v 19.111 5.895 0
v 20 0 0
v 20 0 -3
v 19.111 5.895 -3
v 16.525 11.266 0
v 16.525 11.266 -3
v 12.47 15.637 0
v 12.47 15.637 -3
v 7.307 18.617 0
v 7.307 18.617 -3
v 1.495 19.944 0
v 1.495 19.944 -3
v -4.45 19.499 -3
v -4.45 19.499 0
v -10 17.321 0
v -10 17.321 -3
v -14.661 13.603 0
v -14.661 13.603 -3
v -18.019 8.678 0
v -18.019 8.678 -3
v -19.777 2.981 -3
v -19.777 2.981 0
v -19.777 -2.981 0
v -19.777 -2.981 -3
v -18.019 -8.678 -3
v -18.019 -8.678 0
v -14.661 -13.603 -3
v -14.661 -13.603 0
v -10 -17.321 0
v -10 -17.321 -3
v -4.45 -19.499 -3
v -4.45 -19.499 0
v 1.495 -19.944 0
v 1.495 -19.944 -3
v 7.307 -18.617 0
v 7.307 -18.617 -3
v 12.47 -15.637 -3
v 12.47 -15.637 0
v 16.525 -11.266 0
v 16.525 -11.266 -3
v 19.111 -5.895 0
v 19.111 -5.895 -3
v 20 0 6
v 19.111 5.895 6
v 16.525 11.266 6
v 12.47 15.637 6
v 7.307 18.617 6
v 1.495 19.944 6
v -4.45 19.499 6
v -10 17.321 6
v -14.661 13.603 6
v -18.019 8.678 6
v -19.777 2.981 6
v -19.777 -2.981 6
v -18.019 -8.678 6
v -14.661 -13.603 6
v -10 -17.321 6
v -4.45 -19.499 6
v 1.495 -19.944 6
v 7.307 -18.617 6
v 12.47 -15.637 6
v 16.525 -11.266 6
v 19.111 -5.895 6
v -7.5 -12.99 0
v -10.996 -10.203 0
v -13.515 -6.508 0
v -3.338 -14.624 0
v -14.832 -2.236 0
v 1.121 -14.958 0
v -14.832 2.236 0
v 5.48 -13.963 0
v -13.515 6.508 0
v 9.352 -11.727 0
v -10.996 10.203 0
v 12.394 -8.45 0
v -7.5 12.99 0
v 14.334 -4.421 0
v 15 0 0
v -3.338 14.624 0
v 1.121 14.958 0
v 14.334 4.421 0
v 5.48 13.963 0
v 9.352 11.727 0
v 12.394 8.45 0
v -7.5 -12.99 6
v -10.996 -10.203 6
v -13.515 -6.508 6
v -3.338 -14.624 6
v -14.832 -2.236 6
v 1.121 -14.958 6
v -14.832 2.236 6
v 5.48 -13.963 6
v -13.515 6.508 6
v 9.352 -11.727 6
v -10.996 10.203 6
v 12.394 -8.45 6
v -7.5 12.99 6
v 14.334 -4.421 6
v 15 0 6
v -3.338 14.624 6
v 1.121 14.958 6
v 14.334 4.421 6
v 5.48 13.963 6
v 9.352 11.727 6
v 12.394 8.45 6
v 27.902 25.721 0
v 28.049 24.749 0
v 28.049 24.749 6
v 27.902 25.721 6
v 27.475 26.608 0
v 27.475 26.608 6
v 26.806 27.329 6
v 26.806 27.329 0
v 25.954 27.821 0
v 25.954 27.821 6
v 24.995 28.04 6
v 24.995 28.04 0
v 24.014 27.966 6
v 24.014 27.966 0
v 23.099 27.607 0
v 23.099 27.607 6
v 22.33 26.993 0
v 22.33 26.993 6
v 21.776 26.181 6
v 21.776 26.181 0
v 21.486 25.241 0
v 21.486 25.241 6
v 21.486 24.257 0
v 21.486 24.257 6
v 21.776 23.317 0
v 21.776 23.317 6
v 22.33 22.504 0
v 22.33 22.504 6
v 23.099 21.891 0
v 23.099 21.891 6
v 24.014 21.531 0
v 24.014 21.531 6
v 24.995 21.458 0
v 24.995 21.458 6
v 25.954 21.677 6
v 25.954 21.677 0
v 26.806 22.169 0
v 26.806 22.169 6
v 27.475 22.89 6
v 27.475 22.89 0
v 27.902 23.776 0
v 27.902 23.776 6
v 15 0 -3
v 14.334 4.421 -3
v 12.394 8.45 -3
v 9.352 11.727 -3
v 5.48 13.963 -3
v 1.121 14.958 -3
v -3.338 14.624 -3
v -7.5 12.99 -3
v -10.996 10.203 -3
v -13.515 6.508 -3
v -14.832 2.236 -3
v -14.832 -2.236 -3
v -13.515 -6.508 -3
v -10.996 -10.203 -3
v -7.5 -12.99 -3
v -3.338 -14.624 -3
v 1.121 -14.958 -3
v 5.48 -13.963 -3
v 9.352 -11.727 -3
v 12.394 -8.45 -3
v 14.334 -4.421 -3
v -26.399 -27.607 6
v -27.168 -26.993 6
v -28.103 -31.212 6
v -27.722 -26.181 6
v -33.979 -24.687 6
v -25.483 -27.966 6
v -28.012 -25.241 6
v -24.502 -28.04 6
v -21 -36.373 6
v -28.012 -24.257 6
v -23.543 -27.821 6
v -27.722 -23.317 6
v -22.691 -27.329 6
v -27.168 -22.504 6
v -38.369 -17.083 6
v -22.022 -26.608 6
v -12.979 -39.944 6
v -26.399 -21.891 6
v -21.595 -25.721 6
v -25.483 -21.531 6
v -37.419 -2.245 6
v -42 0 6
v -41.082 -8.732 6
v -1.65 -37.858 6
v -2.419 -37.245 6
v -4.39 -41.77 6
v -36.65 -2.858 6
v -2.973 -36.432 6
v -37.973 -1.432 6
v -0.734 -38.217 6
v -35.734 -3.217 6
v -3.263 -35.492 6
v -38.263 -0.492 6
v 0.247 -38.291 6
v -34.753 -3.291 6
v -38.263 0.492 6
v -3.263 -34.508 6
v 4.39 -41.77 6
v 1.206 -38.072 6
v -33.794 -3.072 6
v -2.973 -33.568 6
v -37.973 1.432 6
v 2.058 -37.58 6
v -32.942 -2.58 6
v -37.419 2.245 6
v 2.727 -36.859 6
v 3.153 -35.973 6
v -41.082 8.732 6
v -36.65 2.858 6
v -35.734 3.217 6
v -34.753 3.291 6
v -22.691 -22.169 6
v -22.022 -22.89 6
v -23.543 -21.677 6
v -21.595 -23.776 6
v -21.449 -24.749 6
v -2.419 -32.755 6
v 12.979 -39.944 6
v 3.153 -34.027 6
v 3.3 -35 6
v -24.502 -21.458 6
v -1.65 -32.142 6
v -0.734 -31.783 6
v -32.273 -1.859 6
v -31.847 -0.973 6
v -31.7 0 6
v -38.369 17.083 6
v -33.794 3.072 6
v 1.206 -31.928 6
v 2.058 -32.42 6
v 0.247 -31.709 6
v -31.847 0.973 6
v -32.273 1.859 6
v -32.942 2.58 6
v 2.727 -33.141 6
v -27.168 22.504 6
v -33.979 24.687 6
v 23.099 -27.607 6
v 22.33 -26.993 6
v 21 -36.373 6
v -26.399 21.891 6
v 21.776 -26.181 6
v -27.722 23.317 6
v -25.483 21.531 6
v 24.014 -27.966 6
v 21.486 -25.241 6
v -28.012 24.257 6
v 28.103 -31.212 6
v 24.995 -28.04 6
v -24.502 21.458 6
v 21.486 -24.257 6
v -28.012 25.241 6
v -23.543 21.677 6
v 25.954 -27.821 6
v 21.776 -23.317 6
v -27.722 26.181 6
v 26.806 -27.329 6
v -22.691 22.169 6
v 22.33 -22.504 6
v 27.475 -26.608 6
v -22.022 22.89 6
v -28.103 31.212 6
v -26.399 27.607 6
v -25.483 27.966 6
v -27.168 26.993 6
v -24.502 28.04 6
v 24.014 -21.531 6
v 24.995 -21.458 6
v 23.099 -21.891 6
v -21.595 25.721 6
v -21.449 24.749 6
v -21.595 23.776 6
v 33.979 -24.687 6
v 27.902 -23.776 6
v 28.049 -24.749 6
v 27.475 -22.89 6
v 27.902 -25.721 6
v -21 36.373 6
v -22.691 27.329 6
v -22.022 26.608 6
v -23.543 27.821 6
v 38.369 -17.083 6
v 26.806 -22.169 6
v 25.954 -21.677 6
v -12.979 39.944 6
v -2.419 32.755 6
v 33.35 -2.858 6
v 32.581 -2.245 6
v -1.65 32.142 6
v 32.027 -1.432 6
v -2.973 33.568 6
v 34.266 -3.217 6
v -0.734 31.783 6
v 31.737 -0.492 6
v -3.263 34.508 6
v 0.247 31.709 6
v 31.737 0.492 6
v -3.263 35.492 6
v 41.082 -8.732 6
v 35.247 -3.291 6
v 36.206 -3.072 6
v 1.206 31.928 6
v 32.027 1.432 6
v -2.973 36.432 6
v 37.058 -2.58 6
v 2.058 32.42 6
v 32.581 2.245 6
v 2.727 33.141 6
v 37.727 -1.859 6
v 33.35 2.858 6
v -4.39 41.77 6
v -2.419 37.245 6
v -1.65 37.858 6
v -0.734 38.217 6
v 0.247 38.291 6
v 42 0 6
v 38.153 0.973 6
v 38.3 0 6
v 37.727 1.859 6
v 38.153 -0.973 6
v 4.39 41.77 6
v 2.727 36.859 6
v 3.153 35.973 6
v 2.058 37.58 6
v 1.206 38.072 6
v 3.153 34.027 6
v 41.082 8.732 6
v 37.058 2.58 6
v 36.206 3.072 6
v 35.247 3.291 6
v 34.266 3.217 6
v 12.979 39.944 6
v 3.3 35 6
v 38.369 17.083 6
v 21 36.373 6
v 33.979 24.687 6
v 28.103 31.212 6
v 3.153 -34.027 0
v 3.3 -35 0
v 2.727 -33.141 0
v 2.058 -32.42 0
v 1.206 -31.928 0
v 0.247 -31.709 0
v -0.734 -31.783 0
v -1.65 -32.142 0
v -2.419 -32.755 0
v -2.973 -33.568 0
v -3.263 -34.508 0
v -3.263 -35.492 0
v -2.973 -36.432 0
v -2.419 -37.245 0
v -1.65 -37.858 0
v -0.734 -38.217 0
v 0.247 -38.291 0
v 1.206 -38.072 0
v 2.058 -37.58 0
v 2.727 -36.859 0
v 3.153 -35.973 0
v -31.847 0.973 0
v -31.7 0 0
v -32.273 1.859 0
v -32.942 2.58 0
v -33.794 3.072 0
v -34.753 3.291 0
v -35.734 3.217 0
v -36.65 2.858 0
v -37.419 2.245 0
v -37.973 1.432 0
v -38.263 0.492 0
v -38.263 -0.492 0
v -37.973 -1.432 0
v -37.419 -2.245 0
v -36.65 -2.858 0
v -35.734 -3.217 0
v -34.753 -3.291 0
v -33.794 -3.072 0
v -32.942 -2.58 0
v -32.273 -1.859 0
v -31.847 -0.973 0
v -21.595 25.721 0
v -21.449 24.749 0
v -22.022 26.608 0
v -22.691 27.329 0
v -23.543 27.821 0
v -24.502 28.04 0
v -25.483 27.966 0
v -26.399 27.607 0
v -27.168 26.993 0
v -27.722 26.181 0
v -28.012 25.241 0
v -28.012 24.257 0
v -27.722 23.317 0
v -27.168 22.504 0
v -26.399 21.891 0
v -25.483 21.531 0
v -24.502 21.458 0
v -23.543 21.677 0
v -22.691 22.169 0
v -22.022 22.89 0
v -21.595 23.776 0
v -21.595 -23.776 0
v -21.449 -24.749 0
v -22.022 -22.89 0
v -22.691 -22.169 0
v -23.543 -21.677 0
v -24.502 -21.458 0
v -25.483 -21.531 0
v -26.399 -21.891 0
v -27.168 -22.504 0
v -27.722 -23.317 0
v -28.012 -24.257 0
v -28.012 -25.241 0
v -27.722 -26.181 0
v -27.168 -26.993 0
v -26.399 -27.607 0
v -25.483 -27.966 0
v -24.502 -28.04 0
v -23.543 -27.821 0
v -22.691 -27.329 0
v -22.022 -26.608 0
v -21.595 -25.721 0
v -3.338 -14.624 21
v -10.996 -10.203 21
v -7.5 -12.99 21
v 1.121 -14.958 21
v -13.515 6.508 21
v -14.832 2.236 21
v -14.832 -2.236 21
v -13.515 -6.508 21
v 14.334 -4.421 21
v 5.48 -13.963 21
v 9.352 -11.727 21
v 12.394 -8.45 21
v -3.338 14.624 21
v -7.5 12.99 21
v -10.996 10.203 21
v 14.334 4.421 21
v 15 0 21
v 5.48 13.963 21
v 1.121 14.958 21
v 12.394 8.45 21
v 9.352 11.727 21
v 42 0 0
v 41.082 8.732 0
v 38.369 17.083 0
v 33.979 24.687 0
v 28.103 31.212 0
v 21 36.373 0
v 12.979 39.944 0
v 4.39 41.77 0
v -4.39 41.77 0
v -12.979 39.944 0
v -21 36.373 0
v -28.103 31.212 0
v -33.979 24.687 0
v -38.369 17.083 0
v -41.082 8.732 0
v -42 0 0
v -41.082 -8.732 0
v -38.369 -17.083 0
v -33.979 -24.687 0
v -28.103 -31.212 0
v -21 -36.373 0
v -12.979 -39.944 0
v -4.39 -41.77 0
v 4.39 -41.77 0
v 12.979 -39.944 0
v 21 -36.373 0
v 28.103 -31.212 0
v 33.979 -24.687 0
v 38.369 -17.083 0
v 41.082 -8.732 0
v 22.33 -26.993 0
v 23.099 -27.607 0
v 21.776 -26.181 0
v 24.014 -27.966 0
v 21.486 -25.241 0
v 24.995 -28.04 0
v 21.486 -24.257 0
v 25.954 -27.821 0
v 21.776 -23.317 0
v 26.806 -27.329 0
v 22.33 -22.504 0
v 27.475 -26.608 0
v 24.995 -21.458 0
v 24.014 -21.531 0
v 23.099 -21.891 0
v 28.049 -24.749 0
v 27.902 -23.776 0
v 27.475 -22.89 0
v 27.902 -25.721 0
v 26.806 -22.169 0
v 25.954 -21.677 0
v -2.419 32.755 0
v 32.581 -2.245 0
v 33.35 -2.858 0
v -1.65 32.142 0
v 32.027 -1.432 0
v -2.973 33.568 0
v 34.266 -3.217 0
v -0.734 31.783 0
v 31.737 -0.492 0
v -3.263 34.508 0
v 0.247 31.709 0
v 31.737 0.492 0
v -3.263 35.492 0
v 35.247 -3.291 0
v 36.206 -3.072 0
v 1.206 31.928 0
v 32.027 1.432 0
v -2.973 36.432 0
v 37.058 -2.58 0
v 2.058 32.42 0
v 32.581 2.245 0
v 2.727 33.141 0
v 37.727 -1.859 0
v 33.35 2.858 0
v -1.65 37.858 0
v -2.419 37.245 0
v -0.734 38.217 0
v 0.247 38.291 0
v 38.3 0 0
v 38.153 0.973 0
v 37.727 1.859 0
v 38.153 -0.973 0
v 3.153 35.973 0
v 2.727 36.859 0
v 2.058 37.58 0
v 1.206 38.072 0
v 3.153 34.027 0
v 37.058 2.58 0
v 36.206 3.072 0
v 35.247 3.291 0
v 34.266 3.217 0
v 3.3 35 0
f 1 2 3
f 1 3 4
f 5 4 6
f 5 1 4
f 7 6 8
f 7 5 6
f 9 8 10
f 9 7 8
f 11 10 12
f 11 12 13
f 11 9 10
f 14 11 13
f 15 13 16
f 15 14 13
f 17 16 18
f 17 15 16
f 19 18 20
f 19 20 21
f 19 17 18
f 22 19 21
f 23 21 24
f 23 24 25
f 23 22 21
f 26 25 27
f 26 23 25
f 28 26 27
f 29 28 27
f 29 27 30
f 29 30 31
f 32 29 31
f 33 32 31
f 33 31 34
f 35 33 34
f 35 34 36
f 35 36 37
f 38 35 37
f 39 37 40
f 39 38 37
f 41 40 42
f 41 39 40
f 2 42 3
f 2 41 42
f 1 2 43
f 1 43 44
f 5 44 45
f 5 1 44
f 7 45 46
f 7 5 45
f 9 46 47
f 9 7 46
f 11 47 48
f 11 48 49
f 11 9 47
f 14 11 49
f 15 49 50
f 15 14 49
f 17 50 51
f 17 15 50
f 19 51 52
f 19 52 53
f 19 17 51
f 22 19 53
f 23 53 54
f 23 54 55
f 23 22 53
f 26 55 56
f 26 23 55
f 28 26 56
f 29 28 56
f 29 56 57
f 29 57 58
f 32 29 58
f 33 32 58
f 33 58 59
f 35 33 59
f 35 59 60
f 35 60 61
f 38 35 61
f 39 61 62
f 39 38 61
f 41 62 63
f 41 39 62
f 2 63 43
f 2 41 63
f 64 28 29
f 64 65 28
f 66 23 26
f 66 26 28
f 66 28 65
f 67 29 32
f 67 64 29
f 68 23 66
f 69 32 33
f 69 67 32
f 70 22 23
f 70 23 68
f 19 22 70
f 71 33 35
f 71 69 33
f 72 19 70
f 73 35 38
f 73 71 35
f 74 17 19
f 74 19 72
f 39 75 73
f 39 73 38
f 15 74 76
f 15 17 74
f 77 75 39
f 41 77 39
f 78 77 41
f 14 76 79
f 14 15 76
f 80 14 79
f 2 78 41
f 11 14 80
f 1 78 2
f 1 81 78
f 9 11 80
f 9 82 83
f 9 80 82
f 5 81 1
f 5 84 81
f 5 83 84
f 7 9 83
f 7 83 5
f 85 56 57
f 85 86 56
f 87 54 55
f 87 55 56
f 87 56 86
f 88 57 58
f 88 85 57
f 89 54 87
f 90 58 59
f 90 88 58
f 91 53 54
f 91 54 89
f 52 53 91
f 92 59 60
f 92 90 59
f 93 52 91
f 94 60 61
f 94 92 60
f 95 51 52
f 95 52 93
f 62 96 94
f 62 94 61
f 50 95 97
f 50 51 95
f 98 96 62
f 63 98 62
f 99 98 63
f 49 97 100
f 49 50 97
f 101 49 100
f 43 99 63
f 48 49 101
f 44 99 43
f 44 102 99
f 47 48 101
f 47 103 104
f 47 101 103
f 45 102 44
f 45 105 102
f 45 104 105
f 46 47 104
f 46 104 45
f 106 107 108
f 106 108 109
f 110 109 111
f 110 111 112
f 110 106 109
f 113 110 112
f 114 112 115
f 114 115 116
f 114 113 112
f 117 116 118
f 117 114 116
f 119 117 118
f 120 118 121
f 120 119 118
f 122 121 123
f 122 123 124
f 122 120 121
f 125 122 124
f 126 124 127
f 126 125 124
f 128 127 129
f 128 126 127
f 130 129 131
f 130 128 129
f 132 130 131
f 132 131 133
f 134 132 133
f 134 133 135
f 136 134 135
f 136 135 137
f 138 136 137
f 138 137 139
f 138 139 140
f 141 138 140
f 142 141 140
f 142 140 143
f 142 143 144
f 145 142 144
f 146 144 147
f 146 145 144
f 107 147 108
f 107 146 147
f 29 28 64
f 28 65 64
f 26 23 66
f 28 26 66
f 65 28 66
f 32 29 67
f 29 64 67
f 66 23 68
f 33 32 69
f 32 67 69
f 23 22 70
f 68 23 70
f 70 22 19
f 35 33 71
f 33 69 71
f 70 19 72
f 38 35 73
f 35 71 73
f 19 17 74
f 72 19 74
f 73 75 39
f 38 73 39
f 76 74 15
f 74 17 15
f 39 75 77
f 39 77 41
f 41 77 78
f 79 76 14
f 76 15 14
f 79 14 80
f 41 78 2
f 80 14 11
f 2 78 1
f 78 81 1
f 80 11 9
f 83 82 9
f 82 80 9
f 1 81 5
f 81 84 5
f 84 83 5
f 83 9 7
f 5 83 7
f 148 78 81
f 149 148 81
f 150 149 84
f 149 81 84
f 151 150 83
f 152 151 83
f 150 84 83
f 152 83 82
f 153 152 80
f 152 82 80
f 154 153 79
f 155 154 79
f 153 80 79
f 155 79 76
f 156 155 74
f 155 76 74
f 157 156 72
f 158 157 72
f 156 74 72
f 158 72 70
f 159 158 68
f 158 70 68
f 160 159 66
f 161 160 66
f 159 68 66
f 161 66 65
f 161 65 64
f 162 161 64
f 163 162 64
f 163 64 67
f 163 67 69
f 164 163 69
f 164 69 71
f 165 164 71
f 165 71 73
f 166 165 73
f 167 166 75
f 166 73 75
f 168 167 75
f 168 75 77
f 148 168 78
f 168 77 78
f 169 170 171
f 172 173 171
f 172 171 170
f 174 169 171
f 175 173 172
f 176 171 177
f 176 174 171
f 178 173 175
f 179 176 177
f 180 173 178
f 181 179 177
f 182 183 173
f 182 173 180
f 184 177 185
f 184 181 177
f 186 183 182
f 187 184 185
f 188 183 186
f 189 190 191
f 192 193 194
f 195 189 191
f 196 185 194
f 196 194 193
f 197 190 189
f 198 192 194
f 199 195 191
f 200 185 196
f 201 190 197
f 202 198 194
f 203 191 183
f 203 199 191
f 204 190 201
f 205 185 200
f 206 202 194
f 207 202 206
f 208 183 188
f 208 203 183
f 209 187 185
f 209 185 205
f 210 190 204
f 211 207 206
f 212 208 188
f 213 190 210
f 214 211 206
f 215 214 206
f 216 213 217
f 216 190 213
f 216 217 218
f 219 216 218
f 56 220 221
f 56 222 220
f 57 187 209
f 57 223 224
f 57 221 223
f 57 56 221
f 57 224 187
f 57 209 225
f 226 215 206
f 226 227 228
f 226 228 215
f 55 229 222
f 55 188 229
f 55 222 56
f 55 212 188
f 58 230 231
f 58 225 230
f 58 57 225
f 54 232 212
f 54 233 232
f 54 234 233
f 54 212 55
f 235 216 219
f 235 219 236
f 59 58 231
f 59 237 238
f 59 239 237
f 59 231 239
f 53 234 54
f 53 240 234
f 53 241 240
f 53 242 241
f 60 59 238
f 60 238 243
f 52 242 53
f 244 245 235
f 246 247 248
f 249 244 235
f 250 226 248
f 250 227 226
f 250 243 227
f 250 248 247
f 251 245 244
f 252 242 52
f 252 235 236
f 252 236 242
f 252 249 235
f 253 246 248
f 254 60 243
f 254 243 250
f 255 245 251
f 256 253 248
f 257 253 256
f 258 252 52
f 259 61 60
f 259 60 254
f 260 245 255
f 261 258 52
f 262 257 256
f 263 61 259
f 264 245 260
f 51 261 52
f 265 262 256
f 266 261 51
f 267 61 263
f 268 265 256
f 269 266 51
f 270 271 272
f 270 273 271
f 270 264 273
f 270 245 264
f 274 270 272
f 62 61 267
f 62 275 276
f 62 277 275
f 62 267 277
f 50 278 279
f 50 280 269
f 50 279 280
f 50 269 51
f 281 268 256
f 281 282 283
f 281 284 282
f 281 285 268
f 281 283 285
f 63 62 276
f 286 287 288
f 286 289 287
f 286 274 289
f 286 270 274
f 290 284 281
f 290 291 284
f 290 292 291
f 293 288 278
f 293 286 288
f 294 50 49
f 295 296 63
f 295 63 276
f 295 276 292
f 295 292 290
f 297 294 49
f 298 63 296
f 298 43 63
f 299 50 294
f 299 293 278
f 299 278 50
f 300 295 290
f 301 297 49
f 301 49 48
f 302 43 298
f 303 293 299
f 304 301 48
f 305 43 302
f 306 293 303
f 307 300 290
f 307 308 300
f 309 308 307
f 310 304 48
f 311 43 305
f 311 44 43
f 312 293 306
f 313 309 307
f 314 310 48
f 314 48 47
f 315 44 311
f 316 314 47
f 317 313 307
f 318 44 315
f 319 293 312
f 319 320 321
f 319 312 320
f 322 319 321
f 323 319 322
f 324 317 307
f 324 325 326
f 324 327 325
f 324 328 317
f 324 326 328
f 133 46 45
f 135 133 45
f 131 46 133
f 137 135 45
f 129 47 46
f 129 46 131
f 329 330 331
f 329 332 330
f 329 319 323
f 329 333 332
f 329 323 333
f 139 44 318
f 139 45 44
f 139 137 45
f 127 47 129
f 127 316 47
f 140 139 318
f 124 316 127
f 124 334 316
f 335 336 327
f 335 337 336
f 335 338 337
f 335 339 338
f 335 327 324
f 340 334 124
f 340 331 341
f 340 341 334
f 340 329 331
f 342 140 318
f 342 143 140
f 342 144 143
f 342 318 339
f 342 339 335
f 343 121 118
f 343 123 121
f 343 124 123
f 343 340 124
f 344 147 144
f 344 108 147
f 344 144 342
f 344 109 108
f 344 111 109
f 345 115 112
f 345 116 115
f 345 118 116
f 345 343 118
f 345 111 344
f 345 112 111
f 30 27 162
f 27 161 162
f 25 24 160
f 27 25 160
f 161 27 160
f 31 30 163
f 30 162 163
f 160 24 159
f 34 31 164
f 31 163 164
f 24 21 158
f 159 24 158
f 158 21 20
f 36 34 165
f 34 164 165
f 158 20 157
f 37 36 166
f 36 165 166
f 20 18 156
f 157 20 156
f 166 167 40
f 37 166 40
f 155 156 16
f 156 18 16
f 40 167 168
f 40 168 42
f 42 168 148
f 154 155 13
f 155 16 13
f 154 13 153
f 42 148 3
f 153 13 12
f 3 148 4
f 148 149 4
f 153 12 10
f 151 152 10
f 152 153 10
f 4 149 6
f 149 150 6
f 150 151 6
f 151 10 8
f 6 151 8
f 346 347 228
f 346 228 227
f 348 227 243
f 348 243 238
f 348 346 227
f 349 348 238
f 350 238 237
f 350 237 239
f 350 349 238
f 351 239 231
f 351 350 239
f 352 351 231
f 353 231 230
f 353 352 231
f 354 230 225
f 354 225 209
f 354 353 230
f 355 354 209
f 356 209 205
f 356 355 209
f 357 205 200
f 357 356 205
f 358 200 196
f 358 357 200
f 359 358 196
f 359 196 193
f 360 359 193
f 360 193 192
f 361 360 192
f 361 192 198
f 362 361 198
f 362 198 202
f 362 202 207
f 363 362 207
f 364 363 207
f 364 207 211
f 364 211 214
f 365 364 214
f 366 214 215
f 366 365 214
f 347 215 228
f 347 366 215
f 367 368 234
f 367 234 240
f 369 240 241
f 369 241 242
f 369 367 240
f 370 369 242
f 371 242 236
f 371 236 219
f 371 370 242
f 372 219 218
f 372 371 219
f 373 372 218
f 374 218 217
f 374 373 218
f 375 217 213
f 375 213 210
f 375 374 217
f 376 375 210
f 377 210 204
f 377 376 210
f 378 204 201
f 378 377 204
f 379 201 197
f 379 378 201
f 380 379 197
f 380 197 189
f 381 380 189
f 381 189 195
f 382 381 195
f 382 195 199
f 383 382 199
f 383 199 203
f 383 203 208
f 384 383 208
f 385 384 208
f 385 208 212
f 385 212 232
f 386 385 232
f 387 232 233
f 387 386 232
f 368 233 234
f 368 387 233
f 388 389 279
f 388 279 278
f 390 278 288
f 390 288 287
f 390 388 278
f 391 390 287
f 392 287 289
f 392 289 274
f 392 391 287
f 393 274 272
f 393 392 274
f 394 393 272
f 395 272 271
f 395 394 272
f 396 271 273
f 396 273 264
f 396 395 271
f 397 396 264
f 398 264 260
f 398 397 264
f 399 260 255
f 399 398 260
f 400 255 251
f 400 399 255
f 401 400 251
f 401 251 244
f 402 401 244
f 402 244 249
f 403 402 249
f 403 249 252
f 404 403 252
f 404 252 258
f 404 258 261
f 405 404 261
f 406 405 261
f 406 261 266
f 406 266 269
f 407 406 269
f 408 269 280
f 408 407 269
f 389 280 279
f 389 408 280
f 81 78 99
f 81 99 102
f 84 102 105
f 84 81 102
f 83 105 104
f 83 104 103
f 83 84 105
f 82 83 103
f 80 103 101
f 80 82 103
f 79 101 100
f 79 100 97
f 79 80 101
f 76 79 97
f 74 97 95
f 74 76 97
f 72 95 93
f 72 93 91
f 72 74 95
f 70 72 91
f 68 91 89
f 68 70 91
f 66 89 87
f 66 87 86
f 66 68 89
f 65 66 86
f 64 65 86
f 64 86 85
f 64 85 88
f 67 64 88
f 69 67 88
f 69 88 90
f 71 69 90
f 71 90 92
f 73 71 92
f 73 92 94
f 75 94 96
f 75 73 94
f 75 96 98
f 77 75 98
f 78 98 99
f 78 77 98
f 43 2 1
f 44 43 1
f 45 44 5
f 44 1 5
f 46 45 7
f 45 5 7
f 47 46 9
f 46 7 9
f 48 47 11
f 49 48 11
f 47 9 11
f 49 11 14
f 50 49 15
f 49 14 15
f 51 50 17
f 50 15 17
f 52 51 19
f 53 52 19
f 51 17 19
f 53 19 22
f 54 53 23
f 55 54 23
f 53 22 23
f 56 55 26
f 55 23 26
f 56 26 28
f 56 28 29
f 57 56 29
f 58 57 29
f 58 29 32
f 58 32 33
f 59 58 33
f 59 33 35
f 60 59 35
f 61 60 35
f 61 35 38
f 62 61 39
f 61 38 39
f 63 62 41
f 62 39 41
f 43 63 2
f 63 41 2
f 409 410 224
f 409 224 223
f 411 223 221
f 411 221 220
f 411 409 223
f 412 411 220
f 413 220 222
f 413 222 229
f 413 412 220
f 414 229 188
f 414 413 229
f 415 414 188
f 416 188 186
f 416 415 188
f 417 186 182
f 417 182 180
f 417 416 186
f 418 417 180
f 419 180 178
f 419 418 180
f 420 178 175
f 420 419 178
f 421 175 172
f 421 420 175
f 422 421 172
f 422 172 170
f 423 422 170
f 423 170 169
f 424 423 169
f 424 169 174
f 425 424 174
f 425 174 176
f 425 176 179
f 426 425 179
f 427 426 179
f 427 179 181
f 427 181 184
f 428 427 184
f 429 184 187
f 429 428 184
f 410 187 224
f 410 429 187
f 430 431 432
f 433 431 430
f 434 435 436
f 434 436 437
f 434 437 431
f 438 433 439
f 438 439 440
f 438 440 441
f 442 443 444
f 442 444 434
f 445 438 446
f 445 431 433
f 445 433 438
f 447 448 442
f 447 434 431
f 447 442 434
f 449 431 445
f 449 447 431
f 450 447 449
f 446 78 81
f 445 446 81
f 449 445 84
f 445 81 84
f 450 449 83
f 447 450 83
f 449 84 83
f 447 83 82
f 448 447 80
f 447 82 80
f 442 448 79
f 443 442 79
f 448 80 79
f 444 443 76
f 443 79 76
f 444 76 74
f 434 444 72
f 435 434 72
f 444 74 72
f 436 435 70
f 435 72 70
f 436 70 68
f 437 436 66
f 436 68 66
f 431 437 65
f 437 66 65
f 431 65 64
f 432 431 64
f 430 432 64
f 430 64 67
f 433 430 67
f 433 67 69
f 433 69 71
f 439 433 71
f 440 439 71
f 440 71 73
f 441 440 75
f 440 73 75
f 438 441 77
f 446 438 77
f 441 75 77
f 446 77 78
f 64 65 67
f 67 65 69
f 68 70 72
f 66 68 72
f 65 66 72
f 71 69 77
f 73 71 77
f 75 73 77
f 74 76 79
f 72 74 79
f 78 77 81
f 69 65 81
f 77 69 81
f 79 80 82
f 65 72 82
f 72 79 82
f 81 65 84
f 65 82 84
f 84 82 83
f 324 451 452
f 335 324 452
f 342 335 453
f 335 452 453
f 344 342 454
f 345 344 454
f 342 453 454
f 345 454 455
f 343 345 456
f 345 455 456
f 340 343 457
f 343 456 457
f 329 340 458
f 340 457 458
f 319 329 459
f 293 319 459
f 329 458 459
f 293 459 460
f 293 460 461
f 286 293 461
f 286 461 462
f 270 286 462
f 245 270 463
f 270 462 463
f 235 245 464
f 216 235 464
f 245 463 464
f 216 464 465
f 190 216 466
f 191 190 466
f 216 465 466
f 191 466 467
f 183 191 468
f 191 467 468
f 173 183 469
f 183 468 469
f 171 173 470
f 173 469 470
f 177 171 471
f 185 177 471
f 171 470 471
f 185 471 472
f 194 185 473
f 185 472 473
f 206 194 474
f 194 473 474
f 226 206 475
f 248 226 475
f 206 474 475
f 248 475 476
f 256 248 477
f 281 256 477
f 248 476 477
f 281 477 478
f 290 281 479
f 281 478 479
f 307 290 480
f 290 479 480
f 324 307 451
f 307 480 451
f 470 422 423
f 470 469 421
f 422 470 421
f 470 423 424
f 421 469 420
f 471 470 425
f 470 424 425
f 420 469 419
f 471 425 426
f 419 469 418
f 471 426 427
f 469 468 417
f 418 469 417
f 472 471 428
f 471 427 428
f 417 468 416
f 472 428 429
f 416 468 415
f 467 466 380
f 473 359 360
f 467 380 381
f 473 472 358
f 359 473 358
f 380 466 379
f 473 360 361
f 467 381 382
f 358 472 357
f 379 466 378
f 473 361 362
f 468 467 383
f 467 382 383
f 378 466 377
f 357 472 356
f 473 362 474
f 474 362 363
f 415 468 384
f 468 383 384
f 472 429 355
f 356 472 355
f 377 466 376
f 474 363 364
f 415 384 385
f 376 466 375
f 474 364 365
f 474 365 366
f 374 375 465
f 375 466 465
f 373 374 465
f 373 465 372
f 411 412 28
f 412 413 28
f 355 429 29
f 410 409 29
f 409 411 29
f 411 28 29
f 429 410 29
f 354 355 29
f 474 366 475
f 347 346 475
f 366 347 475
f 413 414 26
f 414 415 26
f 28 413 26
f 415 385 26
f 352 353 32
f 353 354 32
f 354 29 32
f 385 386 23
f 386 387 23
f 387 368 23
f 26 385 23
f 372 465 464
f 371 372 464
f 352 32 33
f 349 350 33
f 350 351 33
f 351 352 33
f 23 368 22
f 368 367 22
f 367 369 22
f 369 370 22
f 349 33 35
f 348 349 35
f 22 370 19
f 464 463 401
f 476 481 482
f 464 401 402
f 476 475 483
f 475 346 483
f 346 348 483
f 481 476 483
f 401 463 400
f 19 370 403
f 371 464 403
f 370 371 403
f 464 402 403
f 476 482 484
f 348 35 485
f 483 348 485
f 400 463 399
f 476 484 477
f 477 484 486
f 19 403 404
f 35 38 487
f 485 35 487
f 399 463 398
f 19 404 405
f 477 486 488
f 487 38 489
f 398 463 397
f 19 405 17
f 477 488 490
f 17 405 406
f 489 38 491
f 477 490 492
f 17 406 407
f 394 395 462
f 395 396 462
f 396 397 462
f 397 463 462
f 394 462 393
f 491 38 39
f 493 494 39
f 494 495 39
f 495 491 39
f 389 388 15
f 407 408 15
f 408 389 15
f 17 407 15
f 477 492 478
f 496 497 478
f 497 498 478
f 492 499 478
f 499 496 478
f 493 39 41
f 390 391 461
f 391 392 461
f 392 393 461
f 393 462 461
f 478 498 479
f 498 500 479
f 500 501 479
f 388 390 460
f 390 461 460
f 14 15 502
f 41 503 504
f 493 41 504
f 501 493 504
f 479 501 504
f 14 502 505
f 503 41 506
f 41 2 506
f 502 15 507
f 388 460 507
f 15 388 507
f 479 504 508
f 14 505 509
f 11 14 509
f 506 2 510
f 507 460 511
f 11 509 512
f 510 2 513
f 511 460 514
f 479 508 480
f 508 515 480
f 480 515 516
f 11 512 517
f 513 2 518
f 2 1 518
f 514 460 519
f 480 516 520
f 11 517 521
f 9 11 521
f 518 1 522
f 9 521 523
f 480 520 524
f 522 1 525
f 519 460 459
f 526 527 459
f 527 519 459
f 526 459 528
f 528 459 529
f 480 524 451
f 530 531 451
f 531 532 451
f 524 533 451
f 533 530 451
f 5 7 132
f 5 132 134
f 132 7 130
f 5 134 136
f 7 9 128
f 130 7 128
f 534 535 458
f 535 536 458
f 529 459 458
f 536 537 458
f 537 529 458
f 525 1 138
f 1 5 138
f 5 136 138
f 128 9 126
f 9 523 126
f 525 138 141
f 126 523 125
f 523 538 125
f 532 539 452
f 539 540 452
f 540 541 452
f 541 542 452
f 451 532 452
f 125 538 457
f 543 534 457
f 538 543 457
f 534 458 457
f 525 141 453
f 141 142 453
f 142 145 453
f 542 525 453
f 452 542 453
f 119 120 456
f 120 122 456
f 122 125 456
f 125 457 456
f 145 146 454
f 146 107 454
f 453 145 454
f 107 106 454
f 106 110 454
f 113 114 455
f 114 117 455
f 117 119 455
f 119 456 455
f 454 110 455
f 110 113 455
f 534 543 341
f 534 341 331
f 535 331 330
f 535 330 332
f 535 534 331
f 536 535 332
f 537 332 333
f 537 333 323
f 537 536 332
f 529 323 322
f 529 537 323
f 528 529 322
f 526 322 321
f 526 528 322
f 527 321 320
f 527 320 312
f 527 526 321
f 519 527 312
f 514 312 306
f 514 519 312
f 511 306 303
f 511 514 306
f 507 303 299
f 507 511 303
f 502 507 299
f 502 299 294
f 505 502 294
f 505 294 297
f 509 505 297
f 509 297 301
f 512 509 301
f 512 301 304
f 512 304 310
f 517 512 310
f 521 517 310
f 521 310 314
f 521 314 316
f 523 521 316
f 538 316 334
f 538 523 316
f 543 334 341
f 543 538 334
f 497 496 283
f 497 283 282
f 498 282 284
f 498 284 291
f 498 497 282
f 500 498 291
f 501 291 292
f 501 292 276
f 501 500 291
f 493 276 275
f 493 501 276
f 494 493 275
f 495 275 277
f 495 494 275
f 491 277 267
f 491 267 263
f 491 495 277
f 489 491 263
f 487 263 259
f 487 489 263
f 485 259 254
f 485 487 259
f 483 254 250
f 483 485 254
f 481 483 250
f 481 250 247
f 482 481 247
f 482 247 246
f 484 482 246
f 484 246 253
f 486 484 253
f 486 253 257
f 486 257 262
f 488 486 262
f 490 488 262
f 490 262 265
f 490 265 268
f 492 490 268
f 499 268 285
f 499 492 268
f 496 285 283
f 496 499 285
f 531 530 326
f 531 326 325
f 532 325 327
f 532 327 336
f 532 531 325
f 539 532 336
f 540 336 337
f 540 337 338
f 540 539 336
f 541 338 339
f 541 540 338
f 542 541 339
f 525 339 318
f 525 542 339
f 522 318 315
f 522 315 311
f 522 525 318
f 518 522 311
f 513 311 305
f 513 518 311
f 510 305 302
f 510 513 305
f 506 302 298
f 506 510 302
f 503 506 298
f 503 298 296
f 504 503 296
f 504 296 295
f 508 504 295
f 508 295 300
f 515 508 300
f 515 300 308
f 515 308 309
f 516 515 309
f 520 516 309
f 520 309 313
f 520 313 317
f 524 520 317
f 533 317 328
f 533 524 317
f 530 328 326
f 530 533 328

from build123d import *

# Parameters (mm, degrees)
F0_R     = 20
F0_R_2   = 15
F1_DEPTH = 3
F2_DEPTH = 21
F0_R_3   = 42
F0_R_4   = 3.3
F3_DEPTH = 6
F4_DEPTH = 6


with BuildPart() as f1:
    # F0 (on Top) → F1 (new body)
    with BuildSketch(Plane.XY):
        Circle(F0_R)
        Circle(F0_R_2, mode=Mode.SUBTRACT)
    extrude(amount=-F1_DEPTH)


with BuildPart() as f2:
    # F0 (on Top) → F2 (new body)
    with BuildSketch(Plane.XY):
        Circle(F0_R_2)
    extrude(amount=F2_DEPTH)


with BuildPart() as f3:
    # F0 (on Top) → F3 (new body)
    with BuildSketch(Plane.XY):
        Circle(F0_R_3)
        with Locations((-24.748737, -24.748737)):
            Circle(F0_R_4, mode=Mode.SUBTRACT)
        with Locations((0, -35)):
            Circle(F0_R_4, mode=Mode.SUBTRACT)
        with Locations((24.748737, -24.748737)):
            Circle(F0_R_4, mode=Mode.SUBTRACT)
        with Locations((-35, 0)):
            Circle(F0_R_4, mode=Mode.SUBTRACT)
        with Locations((-24.748737, 24.748737)):
            Circle(F0_R_4, mode=Mode.SUBTRACT)
        Circle(F0_R, mode=Mode.SUBTRACT)
        with Locations((35, 0)):
            Circle(F0_R_4, mode=Mode.SUBTRACT)
        with Locations((0, 35)):
            Circle(F0_R_4, mode=Mode.SUBTRACT)
        with Locations((24.748737, 24.748737)):
            Circle(F0_R_4, mode=Mode.SUBTRACT)
    extrude(amount=F3_DEPTH)


with BuildPart() as f4:
    # F0 (on Top) → F4 (new body)
    with BuildSketch(Plane.XY):
        Circle(F0_R)
        Circle(F0_R_2, mode=Mode.SUBTRACT)
    extrude(amount=F4_DEPTH)


solid = Compound([f1.part, f2.part, f3.part, f4.part])
